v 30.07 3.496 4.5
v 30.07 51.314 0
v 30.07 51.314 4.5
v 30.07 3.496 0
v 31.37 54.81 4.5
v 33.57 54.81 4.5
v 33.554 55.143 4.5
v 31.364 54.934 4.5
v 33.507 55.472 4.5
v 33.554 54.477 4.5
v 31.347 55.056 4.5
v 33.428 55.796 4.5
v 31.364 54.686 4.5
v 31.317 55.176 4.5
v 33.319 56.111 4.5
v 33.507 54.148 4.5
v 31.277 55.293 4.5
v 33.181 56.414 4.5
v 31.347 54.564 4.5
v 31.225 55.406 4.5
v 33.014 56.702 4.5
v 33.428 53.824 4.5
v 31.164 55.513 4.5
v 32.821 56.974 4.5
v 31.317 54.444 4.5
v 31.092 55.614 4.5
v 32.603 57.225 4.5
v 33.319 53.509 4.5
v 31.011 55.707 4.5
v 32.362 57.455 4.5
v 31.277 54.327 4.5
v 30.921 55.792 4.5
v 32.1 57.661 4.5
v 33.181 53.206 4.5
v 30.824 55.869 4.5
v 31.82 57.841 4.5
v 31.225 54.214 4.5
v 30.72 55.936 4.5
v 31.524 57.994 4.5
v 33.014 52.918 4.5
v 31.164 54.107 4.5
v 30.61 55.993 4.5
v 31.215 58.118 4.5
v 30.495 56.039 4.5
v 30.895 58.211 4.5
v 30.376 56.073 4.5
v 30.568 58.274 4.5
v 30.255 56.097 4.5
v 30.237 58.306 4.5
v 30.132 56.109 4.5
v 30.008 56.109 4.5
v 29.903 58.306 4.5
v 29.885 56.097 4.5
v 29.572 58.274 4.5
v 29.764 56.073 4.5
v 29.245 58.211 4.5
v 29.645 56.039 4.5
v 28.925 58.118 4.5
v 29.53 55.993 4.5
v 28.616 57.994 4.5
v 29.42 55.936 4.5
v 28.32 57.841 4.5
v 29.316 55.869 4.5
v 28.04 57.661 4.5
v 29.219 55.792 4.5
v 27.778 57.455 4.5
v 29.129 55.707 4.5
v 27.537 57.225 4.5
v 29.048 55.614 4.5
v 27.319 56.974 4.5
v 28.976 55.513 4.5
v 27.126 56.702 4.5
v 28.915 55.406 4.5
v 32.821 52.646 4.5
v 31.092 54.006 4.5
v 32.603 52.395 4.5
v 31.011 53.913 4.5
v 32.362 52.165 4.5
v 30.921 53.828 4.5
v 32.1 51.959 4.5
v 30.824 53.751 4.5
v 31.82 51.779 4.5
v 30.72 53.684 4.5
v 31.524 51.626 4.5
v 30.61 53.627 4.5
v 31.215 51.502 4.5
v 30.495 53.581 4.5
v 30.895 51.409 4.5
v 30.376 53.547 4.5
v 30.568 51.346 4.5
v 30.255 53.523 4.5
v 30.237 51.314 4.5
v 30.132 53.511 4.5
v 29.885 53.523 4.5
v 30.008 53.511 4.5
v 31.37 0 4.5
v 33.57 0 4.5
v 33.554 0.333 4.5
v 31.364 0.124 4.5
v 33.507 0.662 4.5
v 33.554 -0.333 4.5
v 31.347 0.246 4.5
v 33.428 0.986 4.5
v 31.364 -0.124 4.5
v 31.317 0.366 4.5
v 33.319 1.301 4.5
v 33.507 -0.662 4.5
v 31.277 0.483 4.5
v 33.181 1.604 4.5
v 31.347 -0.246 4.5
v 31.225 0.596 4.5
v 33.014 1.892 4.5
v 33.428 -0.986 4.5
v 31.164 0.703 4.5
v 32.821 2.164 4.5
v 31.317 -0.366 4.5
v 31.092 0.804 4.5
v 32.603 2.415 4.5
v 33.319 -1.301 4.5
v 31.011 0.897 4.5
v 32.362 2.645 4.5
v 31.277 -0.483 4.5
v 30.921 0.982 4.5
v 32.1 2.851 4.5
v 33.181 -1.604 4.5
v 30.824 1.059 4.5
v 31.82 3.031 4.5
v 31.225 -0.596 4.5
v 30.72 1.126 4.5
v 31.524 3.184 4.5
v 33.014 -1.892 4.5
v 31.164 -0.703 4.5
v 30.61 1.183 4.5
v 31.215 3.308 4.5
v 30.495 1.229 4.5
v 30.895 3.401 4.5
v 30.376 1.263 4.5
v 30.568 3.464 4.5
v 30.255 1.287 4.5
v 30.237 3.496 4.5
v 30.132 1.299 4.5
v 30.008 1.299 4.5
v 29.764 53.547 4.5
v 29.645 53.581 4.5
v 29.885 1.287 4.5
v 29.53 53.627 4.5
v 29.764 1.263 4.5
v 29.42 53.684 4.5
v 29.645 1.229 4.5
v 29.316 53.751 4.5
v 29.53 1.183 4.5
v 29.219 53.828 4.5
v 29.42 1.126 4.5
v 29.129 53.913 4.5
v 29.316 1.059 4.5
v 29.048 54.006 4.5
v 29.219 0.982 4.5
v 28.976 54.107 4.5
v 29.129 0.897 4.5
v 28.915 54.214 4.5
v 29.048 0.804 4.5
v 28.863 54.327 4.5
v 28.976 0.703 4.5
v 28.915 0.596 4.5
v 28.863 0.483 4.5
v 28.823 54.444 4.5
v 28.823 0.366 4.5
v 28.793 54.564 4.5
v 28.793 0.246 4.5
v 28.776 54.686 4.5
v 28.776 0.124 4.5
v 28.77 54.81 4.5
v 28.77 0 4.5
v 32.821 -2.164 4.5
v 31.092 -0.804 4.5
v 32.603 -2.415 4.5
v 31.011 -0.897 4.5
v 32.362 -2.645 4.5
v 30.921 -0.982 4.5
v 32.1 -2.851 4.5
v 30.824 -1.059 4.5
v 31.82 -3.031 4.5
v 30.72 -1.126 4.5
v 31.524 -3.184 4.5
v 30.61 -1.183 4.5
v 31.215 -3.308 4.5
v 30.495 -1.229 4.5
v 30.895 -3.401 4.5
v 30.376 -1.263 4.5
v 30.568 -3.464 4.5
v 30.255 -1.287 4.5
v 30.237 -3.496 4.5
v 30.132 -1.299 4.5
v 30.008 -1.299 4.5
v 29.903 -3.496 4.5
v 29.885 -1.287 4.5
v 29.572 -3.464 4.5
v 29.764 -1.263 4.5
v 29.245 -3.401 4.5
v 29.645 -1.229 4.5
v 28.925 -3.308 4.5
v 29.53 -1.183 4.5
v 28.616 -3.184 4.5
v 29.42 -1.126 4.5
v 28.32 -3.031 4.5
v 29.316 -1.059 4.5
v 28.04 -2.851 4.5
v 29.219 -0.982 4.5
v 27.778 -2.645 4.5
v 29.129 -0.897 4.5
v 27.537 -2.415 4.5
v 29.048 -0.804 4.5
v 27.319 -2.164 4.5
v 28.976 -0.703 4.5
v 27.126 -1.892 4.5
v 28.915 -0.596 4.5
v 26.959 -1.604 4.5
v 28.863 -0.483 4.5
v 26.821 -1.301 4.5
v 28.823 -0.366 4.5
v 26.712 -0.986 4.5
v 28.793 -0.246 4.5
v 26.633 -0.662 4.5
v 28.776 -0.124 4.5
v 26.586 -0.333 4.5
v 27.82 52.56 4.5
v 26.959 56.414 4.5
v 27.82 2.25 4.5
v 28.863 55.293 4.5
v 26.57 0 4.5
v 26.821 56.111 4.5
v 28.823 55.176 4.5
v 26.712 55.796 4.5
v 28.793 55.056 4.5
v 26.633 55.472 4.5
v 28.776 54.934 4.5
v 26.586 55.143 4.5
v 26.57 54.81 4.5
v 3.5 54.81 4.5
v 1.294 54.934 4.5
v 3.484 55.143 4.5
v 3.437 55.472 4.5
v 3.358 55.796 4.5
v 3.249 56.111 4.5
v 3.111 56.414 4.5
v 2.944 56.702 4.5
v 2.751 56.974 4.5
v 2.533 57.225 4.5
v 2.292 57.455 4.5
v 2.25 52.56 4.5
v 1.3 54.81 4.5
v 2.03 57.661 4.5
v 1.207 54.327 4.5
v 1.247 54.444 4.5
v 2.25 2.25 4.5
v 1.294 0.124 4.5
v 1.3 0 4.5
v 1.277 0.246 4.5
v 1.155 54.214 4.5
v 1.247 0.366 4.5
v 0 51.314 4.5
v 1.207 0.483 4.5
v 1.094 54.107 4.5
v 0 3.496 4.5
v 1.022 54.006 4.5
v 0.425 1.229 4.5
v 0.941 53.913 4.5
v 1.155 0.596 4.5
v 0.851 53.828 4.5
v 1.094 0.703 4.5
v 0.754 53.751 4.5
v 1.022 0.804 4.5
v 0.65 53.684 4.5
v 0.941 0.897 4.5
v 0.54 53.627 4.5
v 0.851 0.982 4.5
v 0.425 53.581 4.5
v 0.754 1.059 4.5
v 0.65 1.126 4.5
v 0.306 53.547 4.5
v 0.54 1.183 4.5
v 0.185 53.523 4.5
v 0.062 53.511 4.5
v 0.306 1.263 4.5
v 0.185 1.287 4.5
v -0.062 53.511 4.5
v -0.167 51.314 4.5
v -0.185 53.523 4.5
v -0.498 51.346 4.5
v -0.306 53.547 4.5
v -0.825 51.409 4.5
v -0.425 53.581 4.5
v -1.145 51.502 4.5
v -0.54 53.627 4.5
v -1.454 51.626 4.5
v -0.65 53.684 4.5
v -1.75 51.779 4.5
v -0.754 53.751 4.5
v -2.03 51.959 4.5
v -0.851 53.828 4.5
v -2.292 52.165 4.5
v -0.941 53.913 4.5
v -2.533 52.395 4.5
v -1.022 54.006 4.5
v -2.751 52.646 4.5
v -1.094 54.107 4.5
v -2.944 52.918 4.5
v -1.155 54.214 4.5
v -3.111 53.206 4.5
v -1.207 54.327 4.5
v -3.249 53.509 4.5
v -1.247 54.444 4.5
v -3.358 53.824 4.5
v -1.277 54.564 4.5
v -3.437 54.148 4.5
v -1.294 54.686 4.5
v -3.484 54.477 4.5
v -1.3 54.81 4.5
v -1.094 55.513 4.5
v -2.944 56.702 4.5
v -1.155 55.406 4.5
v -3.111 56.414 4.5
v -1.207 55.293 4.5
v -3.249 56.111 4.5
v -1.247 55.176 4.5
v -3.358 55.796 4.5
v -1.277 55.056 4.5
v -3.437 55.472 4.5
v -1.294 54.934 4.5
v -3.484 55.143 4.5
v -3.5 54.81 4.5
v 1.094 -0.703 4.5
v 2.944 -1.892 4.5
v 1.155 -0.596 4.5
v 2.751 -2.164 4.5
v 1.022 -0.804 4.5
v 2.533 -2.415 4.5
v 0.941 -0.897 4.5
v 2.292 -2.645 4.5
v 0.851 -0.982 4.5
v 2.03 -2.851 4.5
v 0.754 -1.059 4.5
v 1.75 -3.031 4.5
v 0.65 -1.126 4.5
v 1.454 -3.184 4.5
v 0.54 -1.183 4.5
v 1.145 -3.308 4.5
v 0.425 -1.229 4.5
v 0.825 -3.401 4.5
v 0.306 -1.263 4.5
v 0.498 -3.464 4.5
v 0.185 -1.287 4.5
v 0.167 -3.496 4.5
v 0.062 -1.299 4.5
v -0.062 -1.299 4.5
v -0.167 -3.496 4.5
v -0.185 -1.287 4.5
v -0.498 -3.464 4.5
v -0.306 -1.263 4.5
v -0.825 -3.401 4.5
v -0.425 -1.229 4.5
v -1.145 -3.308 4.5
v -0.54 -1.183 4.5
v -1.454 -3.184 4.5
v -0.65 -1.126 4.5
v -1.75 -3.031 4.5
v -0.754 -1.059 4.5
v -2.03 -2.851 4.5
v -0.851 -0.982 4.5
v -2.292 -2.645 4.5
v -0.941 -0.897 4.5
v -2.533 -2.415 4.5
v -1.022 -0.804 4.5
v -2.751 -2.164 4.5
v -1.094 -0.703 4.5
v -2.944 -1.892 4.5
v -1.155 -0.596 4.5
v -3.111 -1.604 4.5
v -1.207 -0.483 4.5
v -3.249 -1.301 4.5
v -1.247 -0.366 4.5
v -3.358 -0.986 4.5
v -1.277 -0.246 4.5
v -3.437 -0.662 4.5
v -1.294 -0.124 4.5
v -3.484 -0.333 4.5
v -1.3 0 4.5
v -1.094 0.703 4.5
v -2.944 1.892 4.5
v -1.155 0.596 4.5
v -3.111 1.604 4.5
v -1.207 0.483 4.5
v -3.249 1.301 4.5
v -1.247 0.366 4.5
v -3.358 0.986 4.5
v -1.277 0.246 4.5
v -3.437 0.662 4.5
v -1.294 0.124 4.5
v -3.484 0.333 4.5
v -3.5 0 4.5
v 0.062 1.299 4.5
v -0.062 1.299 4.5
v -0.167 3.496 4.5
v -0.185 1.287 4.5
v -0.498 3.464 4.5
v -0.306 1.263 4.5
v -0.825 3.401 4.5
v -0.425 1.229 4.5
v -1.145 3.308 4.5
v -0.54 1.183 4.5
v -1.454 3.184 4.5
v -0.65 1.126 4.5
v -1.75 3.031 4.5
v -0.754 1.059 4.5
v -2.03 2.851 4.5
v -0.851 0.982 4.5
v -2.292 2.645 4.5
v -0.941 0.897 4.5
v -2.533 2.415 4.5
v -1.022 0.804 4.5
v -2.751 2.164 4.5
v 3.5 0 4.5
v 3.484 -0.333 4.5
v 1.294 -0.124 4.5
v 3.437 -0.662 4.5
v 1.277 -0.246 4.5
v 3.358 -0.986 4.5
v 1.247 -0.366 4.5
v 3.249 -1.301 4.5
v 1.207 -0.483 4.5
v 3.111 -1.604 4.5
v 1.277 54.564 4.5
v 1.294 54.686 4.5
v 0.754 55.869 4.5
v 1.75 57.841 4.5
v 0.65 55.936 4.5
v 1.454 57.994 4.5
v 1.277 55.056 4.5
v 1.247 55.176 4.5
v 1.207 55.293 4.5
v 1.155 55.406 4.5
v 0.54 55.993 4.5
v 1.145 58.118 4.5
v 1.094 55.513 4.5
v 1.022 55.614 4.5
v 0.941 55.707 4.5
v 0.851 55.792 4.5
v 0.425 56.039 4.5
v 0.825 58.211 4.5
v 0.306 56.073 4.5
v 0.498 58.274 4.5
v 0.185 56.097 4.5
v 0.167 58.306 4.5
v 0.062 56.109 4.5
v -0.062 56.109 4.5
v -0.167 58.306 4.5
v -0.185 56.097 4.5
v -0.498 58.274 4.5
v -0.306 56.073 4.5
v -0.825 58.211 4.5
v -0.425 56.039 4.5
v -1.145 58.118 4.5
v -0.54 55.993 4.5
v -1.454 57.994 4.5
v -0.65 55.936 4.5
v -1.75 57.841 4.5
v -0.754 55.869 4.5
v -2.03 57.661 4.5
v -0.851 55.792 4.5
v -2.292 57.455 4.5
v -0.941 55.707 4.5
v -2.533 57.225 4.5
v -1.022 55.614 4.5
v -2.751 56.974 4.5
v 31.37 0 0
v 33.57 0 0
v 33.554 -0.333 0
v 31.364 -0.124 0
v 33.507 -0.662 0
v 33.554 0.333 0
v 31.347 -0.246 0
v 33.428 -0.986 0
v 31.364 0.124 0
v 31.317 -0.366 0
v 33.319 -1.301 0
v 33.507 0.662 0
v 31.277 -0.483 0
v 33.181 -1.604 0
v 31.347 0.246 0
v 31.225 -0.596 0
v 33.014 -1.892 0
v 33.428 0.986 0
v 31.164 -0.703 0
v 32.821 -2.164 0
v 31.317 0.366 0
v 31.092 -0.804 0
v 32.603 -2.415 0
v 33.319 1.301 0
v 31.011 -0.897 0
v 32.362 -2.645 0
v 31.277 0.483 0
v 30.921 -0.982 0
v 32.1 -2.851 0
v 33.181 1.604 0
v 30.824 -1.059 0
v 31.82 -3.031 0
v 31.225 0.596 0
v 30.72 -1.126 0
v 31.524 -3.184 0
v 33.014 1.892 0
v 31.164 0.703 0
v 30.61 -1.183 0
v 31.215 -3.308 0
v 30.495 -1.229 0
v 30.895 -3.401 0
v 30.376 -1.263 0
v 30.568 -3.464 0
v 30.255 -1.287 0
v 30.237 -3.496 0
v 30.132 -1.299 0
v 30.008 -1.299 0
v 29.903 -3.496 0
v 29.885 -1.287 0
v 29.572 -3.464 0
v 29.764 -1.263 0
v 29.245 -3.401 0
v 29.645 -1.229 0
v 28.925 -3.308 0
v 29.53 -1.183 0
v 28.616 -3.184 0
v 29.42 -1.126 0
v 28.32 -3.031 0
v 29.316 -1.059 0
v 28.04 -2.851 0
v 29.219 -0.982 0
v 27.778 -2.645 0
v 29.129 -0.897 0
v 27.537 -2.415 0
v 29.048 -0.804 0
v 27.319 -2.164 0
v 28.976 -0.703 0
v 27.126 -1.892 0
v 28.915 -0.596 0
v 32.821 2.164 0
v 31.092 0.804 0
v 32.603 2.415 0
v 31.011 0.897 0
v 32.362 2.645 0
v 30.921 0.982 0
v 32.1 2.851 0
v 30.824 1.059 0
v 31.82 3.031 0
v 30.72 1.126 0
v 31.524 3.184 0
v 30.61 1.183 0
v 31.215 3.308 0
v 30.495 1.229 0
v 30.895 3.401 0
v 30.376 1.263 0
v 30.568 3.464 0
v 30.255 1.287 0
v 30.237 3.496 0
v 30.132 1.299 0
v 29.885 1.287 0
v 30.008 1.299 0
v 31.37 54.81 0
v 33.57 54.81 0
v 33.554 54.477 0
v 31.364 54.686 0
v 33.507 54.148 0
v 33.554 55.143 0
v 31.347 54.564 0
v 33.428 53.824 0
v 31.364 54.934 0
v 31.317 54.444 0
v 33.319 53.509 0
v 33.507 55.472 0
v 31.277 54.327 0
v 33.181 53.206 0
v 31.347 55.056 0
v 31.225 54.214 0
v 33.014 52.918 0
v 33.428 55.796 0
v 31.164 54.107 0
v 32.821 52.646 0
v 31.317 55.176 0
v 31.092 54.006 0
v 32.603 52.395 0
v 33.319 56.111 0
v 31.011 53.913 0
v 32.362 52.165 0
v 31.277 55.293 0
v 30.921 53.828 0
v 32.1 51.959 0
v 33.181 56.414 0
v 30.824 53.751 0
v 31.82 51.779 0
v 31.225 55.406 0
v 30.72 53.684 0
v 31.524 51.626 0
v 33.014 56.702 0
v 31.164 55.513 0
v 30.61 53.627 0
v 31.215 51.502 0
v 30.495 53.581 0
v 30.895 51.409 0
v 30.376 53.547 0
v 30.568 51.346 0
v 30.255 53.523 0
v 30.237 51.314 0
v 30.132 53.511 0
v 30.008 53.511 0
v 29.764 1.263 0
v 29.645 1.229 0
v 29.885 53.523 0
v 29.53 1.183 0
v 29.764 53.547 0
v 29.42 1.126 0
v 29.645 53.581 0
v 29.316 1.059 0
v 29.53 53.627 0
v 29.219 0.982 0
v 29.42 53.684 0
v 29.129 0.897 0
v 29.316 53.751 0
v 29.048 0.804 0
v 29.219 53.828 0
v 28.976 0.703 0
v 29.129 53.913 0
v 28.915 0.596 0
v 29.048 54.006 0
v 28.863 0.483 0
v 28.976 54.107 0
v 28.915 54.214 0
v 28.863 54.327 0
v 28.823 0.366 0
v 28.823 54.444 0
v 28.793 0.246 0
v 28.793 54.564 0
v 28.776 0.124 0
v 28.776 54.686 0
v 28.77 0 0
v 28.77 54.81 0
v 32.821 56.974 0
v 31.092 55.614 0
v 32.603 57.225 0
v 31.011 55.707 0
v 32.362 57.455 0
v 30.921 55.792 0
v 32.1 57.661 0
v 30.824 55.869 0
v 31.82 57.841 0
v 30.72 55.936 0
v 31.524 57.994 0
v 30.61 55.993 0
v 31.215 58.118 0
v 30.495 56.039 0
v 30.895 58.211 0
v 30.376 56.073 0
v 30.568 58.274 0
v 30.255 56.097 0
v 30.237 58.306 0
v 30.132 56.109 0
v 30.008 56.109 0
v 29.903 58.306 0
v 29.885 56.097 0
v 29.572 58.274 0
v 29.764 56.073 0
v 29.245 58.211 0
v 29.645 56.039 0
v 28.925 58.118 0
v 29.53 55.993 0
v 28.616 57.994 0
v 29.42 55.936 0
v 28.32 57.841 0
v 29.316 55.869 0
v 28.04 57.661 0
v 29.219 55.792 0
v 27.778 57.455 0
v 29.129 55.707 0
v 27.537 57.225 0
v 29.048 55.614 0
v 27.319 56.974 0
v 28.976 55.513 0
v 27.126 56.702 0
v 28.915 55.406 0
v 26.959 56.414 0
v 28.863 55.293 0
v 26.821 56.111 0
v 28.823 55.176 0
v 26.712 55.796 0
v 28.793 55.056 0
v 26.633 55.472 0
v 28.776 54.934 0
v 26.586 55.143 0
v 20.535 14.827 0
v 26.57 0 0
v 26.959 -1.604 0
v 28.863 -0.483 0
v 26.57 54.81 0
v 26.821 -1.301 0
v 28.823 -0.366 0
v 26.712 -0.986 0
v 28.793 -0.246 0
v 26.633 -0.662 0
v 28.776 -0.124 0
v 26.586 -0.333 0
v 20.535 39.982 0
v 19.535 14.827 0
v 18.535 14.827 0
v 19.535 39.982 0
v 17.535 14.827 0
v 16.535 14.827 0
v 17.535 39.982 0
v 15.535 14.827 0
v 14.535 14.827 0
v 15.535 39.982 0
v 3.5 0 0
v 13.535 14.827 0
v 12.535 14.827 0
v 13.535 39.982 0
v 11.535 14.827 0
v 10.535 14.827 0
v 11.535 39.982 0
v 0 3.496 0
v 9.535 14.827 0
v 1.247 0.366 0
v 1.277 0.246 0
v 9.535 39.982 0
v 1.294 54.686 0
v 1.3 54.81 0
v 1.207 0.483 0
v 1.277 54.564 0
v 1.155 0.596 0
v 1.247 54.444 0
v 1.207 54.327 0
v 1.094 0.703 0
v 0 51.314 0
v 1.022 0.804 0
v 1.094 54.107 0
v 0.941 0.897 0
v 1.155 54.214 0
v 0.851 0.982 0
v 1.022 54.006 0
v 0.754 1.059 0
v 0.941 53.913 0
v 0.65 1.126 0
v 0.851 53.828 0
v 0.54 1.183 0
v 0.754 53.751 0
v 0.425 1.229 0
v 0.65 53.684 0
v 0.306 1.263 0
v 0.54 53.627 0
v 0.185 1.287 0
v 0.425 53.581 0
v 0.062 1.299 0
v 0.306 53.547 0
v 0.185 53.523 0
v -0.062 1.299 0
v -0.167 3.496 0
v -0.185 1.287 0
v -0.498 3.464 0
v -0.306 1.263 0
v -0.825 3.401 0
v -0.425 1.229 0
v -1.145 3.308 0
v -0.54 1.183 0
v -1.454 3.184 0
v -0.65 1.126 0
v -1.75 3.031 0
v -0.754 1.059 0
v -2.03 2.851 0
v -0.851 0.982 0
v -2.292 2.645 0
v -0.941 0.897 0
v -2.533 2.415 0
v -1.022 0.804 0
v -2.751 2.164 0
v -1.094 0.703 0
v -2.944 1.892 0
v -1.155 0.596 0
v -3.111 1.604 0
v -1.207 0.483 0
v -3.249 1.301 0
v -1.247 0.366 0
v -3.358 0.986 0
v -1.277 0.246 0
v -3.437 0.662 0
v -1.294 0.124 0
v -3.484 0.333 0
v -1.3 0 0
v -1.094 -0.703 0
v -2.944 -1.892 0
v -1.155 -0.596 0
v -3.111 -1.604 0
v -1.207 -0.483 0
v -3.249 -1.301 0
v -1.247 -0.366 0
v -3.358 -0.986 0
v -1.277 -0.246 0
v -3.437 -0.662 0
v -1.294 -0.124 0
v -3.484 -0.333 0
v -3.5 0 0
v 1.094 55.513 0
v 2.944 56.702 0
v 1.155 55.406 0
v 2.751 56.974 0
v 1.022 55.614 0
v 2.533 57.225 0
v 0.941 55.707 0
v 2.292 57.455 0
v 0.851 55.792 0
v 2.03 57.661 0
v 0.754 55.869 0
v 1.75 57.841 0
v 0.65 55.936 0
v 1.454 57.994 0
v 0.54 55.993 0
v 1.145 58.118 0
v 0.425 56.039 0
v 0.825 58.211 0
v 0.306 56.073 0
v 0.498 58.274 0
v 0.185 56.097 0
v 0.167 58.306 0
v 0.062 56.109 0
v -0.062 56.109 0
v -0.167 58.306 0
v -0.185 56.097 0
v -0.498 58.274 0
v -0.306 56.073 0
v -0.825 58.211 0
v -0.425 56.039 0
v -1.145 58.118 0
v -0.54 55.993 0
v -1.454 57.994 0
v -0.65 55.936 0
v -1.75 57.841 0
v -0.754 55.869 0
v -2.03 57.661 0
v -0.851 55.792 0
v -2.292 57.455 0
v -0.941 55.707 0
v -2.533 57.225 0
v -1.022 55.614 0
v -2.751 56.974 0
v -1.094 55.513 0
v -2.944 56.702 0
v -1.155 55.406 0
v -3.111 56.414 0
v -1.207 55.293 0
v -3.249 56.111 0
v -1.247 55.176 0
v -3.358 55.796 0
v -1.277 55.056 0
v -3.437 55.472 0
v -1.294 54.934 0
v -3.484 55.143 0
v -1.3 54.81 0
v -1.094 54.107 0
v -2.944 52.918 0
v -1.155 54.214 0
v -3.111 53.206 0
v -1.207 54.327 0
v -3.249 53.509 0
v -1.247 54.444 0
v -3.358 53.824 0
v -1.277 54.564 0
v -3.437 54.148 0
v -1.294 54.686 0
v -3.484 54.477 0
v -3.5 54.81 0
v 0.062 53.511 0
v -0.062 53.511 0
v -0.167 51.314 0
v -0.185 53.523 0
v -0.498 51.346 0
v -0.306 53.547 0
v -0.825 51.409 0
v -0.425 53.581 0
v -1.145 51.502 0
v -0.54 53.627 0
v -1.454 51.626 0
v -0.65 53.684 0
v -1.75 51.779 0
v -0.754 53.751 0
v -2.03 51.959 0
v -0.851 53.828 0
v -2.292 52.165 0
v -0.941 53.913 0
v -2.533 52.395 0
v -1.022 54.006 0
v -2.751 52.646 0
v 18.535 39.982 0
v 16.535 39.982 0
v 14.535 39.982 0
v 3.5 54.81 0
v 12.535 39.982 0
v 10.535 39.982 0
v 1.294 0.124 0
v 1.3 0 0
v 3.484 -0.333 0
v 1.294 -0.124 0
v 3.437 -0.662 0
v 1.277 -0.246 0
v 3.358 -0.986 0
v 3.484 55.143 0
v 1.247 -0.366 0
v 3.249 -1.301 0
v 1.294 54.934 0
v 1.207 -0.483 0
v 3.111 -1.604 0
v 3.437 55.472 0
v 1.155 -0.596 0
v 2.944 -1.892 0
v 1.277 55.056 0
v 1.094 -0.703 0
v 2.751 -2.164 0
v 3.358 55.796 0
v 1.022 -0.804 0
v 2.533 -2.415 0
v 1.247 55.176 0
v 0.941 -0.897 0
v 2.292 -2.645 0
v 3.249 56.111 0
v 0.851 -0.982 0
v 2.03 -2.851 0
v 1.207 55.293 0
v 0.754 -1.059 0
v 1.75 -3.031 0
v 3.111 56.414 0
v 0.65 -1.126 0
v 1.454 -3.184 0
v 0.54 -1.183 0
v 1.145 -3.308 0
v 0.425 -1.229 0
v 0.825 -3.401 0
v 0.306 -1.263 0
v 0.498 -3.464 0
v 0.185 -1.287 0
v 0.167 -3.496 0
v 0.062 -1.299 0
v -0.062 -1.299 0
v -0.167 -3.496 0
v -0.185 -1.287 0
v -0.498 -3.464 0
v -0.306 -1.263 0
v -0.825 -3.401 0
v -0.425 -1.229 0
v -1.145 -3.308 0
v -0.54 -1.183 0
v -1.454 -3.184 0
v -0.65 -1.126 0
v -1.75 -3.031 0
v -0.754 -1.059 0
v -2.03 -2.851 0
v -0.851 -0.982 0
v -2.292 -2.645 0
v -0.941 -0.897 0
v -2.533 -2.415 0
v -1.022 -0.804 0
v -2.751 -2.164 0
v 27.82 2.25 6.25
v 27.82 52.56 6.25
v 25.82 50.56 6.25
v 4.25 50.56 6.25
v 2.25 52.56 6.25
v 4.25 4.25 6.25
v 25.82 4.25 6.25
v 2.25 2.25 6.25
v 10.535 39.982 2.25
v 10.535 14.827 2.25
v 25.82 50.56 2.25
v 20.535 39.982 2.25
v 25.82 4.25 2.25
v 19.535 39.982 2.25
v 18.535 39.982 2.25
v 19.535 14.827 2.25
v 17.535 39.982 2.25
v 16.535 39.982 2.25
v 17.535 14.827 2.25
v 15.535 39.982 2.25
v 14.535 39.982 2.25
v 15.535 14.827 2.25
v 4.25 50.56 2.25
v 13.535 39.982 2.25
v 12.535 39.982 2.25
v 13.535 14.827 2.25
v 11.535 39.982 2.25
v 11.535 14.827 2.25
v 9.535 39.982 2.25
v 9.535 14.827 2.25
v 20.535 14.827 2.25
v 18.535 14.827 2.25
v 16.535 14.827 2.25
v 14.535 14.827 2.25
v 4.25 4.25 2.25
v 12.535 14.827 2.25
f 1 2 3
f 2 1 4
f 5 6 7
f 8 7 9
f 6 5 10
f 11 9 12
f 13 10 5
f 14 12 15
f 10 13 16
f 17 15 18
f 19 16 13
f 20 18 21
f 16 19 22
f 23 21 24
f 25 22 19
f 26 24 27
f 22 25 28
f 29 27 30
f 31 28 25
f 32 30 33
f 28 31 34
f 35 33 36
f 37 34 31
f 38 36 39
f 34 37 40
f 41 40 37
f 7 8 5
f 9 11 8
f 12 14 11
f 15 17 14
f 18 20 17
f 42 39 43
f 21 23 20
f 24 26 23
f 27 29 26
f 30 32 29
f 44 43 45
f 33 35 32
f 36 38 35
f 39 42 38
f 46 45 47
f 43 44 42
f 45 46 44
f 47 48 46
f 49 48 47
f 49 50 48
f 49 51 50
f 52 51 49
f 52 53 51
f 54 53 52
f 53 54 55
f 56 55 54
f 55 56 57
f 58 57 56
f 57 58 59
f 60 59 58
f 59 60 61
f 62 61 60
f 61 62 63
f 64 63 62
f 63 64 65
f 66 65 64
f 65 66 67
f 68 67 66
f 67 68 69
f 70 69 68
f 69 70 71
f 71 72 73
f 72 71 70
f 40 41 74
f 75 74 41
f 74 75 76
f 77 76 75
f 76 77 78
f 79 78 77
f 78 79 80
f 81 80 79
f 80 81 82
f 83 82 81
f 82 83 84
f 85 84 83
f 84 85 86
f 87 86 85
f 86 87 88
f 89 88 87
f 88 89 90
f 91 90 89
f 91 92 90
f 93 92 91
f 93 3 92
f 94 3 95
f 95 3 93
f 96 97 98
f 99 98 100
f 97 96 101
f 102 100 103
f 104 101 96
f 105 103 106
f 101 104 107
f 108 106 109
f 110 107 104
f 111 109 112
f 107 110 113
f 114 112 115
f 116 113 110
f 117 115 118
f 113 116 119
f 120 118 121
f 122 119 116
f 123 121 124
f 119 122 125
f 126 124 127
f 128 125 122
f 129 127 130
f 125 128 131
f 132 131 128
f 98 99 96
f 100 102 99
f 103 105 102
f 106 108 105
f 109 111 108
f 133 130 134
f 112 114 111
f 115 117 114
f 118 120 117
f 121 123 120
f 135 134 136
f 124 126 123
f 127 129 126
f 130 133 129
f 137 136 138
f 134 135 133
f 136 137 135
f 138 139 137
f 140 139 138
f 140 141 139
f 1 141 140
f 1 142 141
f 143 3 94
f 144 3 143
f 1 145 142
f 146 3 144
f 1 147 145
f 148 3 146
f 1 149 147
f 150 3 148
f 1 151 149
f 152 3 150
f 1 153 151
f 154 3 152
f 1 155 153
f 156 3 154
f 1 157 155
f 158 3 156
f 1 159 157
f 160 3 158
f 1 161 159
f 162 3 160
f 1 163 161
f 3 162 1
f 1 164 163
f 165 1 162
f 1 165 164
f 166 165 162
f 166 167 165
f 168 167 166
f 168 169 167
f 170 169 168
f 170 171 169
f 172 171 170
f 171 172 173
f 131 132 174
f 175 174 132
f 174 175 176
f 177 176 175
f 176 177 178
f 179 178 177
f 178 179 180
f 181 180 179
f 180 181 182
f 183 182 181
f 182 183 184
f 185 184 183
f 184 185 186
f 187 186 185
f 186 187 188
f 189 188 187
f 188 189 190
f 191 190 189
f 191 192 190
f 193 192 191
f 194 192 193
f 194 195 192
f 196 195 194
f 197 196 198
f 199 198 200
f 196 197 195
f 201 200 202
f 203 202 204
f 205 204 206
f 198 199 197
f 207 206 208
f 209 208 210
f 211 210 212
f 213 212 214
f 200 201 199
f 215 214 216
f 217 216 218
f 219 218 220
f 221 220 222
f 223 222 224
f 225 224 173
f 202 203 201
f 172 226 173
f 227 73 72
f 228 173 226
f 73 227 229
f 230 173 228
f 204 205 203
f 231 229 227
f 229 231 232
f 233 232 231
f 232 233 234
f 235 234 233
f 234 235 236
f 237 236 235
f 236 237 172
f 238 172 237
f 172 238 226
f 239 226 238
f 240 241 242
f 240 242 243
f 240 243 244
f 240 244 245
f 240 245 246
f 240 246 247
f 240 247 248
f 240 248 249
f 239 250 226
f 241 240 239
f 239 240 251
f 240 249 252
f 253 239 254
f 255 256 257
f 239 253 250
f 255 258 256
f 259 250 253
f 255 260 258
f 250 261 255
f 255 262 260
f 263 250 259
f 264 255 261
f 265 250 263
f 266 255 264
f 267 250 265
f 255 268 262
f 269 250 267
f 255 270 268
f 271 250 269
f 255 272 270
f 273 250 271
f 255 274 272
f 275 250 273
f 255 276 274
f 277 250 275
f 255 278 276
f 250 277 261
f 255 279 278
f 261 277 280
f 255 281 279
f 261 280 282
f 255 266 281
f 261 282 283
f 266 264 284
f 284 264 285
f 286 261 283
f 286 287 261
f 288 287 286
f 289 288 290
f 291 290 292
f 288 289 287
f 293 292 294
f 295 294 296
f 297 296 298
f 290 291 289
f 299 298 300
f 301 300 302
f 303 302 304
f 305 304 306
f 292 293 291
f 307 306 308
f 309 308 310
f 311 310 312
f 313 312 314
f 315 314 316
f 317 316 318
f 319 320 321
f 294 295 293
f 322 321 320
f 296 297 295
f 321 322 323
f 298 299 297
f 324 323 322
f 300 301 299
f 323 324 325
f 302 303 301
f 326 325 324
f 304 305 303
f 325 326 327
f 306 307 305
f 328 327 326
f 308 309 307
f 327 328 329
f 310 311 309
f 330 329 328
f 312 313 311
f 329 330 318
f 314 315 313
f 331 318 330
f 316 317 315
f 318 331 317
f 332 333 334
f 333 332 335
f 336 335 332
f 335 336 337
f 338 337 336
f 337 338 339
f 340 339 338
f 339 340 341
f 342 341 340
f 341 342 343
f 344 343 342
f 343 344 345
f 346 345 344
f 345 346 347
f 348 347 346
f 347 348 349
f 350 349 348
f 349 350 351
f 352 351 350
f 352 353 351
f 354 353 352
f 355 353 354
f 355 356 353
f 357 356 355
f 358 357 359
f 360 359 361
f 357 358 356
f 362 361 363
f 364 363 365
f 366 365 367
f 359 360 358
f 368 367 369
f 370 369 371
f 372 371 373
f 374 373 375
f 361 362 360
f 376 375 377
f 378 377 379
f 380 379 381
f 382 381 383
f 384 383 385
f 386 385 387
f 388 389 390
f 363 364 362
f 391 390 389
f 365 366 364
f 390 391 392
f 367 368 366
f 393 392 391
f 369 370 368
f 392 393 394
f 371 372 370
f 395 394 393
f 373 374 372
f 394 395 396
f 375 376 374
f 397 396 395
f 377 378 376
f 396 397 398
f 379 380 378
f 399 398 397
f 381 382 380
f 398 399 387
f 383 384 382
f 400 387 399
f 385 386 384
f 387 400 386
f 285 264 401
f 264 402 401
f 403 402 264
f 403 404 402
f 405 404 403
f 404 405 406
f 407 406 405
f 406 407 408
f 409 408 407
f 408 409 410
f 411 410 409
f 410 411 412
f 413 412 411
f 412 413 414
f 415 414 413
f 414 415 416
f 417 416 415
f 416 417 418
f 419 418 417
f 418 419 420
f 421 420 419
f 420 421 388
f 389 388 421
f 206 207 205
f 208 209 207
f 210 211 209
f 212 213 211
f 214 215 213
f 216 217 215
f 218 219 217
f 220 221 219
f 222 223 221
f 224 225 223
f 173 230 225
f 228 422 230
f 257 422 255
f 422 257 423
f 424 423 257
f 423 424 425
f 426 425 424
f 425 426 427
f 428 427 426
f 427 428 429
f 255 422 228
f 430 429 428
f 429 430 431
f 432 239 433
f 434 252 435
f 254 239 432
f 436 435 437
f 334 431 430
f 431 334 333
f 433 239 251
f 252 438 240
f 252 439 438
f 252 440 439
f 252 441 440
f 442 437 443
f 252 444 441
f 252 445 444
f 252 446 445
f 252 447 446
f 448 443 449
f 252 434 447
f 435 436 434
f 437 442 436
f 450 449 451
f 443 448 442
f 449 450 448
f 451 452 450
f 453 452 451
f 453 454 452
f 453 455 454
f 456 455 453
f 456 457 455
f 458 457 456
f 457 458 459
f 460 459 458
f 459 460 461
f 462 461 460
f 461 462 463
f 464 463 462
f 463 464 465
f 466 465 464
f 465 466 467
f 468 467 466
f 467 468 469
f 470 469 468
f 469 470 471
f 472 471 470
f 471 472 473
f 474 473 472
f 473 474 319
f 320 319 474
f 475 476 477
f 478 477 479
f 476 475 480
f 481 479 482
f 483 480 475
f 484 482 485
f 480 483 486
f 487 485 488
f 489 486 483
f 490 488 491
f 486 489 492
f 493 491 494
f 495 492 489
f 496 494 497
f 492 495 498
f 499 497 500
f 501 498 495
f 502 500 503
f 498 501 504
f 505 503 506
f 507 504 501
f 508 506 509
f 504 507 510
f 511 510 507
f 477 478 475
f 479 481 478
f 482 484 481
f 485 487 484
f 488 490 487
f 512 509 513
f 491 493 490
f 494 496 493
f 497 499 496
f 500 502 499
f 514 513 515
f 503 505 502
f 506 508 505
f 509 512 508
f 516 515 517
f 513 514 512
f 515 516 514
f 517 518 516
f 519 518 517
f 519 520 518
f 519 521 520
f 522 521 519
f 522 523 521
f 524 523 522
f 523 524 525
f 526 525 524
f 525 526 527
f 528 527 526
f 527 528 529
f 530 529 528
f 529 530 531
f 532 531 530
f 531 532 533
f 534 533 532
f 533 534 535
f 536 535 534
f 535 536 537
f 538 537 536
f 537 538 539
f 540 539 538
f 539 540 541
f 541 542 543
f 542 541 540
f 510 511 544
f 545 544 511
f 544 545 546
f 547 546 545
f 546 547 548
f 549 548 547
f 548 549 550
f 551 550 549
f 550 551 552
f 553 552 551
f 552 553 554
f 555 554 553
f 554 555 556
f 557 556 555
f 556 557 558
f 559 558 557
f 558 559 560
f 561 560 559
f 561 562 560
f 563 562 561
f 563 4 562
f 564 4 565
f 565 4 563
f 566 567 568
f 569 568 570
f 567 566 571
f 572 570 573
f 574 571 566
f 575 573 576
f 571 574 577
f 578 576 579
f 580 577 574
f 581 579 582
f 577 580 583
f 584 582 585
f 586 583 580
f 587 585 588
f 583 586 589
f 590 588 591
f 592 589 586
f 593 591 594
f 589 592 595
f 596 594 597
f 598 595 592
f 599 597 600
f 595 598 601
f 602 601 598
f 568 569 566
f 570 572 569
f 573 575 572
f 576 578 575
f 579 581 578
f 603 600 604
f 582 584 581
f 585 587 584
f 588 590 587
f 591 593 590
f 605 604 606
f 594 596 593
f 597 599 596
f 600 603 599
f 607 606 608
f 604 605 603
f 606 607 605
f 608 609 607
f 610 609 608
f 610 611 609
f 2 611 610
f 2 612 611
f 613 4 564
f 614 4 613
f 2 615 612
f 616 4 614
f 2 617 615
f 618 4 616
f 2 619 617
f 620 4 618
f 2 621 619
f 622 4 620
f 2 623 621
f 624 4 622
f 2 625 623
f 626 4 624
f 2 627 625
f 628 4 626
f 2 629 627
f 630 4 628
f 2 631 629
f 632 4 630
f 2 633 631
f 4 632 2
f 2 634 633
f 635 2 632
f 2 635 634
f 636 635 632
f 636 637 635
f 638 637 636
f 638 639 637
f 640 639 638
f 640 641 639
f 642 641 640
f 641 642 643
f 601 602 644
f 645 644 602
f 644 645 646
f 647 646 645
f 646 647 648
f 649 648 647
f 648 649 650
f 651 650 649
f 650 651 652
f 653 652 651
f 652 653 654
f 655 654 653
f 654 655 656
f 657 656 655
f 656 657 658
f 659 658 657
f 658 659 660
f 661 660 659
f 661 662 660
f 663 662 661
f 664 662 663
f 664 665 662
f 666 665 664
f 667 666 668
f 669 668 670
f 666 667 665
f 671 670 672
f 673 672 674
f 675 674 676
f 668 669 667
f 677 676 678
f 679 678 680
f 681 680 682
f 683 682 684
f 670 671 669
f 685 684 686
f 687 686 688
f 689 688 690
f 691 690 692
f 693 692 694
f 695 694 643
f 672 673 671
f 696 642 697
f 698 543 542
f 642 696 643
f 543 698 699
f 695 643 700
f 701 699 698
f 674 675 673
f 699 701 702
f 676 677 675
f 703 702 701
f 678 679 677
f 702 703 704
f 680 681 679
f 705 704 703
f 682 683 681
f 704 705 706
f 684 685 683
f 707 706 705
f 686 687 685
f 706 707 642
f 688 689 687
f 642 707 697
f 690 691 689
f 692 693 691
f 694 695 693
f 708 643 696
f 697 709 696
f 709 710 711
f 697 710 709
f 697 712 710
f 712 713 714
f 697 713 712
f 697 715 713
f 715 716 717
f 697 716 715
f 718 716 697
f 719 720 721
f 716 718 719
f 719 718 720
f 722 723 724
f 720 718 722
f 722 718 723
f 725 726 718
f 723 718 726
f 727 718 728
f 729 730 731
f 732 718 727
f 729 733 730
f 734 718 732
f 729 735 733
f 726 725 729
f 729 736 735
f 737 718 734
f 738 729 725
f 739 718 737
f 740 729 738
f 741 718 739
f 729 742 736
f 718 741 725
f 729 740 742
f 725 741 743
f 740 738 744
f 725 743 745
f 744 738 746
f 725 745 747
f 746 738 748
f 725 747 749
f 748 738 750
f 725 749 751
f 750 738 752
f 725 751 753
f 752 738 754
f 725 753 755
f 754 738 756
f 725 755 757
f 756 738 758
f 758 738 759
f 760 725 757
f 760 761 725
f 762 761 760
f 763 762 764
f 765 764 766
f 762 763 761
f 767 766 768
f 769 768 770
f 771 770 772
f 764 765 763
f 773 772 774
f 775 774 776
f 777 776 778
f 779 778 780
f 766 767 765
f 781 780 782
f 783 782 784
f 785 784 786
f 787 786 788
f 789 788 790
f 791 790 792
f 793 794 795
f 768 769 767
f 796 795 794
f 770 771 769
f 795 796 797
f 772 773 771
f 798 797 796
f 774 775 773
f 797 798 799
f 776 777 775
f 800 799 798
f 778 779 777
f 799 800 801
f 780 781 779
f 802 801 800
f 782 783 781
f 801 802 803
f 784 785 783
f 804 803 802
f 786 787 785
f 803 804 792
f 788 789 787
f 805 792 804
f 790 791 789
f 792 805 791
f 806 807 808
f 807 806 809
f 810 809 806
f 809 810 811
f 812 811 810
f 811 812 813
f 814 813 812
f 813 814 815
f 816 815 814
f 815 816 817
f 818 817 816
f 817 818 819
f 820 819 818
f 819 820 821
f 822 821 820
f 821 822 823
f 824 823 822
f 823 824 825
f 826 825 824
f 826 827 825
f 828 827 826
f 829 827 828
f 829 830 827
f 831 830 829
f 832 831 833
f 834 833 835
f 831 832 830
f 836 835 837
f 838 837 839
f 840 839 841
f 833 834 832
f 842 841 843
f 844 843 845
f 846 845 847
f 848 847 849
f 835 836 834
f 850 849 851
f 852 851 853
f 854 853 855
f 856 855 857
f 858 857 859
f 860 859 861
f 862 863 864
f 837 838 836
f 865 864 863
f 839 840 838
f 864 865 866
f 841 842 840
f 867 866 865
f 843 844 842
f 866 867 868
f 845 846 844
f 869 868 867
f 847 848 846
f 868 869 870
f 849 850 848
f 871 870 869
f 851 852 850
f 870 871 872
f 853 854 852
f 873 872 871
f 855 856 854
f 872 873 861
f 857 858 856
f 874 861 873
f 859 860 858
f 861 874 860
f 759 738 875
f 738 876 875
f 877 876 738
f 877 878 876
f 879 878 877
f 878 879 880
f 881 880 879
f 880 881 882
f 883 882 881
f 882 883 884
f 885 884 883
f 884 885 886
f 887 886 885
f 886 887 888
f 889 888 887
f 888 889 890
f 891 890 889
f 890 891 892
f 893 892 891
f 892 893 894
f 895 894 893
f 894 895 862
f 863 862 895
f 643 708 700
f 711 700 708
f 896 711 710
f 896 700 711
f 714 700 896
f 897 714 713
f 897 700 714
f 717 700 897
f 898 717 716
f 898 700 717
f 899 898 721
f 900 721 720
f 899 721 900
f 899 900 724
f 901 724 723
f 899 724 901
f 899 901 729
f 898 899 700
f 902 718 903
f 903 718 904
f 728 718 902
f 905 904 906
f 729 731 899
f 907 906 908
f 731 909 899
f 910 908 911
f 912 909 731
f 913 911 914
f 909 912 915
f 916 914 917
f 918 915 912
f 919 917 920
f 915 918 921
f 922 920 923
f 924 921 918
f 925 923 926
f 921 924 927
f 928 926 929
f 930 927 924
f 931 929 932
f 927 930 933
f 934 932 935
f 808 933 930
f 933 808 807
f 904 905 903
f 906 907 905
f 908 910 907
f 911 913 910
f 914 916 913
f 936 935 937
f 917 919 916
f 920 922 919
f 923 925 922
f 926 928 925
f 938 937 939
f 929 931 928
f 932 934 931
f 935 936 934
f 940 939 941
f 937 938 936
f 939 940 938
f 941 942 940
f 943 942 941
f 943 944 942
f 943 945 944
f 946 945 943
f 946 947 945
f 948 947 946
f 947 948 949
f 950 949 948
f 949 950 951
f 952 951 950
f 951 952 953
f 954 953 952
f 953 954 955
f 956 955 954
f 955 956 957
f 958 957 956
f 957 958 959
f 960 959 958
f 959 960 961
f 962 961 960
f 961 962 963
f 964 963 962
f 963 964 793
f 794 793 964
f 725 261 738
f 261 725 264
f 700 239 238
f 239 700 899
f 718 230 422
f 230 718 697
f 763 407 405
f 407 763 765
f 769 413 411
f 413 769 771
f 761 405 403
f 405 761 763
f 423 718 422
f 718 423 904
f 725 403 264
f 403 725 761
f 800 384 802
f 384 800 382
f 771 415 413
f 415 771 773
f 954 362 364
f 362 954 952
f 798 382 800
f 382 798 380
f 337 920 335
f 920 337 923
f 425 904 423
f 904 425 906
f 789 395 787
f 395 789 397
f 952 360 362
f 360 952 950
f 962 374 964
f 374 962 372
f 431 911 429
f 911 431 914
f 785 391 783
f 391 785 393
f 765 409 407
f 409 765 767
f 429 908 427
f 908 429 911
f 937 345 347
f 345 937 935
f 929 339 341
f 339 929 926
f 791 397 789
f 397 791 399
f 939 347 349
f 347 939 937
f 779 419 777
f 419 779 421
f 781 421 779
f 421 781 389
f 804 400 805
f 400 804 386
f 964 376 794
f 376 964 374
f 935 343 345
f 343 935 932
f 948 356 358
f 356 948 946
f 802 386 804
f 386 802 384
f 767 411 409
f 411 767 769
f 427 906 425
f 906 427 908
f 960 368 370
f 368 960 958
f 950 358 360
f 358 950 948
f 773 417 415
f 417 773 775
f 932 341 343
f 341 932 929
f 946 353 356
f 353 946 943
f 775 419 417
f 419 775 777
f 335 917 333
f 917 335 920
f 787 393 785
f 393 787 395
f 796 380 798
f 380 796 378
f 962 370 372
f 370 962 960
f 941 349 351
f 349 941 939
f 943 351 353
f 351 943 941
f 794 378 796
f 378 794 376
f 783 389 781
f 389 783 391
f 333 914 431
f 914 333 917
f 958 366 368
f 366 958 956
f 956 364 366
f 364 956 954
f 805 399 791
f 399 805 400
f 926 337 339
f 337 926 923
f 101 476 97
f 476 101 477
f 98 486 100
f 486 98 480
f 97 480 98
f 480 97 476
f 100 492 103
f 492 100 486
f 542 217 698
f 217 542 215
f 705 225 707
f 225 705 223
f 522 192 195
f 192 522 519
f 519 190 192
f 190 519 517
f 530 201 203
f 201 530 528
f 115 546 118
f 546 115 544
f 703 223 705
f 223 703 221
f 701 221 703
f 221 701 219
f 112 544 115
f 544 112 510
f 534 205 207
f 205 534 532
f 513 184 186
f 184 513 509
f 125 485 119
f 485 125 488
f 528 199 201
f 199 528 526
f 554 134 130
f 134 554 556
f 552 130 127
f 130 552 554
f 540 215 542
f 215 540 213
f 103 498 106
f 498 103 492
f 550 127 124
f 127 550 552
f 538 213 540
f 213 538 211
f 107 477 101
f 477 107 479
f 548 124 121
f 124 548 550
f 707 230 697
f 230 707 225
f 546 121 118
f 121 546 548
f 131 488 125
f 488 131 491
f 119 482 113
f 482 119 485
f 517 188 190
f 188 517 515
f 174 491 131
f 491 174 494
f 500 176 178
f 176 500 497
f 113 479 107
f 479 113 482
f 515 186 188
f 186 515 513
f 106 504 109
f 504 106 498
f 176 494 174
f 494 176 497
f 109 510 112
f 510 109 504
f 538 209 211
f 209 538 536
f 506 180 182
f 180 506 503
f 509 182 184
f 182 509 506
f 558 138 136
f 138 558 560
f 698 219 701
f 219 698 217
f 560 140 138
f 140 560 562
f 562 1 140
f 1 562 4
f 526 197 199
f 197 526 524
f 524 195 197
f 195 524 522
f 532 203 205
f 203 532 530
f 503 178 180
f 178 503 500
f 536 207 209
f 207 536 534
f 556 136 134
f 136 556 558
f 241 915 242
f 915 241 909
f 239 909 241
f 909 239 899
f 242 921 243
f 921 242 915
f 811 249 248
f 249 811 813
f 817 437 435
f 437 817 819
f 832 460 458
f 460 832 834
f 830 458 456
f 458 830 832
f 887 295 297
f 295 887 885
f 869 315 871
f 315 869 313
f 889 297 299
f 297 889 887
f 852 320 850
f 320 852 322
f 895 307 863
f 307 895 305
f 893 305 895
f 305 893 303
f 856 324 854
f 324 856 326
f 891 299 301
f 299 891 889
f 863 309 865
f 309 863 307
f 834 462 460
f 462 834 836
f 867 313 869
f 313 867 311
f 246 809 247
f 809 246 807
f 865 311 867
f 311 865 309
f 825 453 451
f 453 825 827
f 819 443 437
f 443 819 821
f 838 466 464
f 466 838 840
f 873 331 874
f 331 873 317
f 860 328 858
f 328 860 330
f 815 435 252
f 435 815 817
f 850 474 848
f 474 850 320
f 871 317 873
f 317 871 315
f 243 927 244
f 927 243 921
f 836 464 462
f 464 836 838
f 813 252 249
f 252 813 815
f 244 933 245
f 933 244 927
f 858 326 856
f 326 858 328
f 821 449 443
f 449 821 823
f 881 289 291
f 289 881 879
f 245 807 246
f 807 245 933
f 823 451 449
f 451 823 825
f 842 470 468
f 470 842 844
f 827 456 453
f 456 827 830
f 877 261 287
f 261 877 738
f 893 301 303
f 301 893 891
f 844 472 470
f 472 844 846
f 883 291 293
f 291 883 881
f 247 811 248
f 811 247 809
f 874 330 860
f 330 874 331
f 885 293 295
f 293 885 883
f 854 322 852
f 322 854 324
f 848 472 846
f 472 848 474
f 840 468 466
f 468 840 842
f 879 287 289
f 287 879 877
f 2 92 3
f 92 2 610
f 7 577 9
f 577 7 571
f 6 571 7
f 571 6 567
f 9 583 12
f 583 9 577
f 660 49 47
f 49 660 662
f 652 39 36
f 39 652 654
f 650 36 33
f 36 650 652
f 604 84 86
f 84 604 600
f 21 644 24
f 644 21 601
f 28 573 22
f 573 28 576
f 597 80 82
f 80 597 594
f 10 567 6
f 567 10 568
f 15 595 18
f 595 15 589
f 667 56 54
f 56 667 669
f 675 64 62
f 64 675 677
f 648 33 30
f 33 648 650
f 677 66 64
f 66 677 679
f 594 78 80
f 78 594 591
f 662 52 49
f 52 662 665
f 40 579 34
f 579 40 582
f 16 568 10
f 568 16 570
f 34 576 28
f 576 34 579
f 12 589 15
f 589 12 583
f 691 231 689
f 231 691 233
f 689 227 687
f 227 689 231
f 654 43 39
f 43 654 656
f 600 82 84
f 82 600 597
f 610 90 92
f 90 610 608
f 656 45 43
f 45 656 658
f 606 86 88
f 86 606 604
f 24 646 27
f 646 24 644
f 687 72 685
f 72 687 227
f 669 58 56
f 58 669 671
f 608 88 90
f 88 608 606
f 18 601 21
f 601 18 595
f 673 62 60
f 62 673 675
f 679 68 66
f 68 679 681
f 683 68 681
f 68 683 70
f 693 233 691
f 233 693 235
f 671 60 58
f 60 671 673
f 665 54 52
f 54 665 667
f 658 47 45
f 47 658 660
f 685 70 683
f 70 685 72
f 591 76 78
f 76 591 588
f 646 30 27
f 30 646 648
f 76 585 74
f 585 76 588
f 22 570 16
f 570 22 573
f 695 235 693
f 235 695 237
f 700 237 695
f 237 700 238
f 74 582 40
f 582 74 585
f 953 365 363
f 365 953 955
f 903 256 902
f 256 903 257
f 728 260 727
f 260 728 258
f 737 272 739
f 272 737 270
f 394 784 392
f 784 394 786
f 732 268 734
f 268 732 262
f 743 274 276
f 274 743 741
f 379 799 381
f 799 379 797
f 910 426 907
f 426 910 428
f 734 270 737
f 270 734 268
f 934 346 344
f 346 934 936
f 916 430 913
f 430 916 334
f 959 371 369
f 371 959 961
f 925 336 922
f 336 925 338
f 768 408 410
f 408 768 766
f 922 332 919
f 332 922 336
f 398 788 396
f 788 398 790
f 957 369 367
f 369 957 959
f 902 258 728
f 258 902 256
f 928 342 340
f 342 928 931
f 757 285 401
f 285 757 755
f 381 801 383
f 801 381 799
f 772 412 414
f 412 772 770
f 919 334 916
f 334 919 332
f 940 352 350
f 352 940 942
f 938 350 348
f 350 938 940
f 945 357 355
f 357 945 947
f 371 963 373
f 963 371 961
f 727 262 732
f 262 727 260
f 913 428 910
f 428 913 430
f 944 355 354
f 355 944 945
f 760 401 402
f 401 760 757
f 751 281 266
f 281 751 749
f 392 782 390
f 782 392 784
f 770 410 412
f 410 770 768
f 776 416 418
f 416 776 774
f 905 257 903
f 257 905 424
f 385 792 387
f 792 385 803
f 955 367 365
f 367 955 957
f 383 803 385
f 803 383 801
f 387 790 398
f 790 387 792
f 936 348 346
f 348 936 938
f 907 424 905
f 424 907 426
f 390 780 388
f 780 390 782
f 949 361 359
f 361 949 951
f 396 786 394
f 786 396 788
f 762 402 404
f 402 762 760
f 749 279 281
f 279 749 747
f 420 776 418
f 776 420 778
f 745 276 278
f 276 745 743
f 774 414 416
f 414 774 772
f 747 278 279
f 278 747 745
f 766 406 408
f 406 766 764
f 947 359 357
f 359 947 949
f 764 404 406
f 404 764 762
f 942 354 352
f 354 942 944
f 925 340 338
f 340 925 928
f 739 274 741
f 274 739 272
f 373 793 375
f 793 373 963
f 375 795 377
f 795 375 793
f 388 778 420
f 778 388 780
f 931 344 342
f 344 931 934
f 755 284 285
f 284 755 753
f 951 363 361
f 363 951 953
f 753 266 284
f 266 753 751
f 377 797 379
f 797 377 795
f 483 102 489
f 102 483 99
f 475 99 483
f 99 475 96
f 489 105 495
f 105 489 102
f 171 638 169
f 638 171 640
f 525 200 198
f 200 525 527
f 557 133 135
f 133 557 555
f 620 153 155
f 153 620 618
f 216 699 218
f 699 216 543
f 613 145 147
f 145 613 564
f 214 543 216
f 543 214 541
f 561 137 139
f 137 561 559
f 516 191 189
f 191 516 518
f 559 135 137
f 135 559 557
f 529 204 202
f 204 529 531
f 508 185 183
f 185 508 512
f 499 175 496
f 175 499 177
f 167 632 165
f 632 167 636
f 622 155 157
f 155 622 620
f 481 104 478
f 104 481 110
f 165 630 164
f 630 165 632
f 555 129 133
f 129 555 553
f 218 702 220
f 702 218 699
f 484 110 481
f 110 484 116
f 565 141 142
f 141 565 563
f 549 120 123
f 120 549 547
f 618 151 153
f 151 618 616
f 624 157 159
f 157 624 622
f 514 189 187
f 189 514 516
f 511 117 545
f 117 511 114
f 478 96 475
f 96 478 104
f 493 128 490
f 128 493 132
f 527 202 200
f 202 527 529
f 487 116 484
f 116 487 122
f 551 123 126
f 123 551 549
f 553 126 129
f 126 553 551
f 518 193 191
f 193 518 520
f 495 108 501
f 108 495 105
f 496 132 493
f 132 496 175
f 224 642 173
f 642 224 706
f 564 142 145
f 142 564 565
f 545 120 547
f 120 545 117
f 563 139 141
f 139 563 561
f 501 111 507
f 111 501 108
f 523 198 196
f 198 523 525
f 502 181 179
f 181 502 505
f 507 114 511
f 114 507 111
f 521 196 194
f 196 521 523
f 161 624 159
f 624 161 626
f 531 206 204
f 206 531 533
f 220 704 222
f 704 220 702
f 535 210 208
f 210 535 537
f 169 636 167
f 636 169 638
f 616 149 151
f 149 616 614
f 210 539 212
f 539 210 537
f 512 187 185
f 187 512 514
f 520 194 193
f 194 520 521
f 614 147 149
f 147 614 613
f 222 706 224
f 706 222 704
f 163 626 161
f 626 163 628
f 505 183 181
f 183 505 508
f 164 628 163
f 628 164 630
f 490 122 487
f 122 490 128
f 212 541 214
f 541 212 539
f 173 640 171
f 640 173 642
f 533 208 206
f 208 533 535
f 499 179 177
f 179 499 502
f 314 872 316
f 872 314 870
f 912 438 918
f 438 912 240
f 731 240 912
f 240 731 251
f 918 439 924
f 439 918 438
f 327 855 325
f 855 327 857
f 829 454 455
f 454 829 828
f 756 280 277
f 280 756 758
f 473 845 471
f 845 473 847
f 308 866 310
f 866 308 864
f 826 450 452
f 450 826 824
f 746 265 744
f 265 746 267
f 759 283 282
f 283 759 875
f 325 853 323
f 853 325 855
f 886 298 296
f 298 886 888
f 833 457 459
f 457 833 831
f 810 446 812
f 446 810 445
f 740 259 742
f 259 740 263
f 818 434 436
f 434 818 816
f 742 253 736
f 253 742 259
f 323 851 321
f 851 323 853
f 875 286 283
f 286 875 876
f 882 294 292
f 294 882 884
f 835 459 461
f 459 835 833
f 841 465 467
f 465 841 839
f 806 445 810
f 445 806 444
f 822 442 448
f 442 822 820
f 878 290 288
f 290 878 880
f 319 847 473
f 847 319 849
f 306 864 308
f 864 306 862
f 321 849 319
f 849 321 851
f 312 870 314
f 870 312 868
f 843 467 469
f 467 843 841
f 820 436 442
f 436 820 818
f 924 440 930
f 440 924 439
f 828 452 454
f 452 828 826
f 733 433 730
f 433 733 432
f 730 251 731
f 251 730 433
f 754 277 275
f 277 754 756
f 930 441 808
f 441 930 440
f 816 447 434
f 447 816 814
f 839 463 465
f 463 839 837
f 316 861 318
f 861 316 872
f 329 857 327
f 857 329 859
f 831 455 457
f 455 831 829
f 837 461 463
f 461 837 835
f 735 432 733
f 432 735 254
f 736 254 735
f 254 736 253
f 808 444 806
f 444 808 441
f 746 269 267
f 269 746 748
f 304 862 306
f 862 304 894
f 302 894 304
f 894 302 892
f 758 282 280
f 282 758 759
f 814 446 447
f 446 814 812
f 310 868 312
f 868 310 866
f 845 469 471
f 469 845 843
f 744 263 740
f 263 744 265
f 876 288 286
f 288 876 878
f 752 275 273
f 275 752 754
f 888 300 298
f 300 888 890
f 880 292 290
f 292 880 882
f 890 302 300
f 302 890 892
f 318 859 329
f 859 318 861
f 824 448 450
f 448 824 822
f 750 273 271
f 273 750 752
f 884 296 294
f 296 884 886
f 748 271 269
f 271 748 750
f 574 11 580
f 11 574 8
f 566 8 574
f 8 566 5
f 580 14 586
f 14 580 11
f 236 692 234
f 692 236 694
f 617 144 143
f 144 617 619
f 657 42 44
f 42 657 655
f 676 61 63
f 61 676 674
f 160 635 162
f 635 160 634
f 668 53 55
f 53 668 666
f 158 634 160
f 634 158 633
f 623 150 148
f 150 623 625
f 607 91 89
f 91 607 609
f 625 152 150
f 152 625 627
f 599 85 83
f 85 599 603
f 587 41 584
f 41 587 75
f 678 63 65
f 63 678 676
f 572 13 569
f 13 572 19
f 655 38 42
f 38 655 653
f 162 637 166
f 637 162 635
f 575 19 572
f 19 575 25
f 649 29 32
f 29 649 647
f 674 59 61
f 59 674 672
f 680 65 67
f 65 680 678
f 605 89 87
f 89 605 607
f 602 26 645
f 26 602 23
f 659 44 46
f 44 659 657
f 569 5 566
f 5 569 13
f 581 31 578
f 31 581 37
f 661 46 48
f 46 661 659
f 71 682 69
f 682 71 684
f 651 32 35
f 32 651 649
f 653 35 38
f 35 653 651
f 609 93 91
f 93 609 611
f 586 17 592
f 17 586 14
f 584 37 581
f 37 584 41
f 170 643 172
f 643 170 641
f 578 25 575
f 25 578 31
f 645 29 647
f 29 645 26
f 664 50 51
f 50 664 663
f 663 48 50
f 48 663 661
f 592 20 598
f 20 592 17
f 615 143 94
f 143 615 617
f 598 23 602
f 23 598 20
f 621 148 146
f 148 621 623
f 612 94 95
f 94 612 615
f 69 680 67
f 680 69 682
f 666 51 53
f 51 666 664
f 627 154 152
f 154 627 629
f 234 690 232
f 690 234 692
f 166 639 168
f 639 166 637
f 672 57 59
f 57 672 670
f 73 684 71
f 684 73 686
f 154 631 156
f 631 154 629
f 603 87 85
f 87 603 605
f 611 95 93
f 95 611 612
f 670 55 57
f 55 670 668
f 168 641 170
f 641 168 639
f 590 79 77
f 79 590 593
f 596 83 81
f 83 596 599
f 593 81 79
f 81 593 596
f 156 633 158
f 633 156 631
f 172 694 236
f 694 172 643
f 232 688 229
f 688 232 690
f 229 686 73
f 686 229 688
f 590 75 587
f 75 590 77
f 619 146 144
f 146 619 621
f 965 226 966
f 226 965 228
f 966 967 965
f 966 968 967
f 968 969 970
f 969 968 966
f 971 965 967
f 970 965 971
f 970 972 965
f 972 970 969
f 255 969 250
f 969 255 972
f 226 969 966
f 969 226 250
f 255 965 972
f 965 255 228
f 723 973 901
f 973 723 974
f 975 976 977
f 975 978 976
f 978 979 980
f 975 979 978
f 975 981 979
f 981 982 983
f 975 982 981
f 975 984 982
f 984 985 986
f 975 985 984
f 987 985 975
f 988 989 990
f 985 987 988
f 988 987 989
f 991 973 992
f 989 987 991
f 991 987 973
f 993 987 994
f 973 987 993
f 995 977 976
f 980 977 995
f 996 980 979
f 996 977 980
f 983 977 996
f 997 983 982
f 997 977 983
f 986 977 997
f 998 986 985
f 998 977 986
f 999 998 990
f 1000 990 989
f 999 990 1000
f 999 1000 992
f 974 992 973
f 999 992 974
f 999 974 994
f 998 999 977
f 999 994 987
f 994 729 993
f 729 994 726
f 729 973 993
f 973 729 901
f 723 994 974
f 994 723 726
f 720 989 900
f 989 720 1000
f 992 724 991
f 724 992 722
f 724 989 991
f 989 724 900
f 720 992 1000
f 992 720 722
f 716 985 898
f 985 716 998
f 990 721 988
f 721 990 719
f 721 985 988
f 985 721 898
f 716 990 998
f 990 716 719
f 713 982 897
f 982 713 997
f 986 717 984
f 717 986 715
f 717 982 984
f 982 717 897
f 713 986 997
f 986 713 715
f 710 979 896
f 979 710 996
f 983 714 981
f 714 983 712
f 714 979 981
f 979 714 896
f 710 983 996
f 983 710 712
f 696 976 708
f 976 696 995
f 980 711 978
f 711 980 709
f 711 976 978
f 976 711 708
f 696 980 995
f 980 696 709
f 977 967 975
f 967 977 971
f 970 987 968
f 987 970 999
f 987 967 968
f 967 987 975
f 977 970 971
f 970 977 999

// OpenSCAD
board_x = 25.57;
board_y = 50.31;
wall_thickness = 2.25;
corner_rad = 7.0 / 2;
front_height = 17;
lcd_ridge_height = 4; //4.5;
lcd_hole_x_len = 15.0;
lcd_hole_y_len = 23.0;
lcd_hole_x = 4.35;
lcd_hole_y = 7;
lcd_x_frame = 2.5;
lcd_y_frame = 6.0;
lcd_x_len = 20;
lcd_y_len = 25.75;
control_y = 14.75;

// back
back_height = wall_thickness;



module outside(height) {
    difference() {
        union() {
            cube([board_x + (2* wall_thickness),
                board_y + (2 * wall_thickness),
                    height + wall_thickness]);
            cylinder(r=corner_rad, h=(height+wall_thickness), $fn=66);
            translate([board_x + (2*wall_thickness), 0, 0]) cylinder(r=corner_rad, h=(height+wall_thickness), $fn=66);
            translate([0, board_y + (2*wall_thickness), 0]) cylinder(r=corner_rad, h=(height+wall_thickness), $fn=66);
            translate([board_x + (2*wall_thickness), board_y + (2*wall_thickness), 0]) cylinder(r=corner_rad, h=(height+wall_thickness), $fn=66);           
        }
        cylinder(r=1.3, h=(height + wall_thickness + 0.01), $fn=66);
        translate([board_x + (2*wall_thickness), 0, 0]) cylinder(r=1.3, h=(height + wall_thickness + 0.01), $fn=66);
        translate([0, board_y + (2*wall_thickness), 0]) cylinder(r=1.3, h=(height + wall_thickness + 0.01), $fn=66);
        translate([board_x + (2*wall_thickness), board_y + (2*wall_thickness), 0]) cylinder(r=1.3, h=(height + wall_thickness + 0.01), $fn=66);
    
    }
}

module front() {
    difference() {
        outside(front_height);
    
        //lcd hole
        translate([wall_thickness + lcd_hole_x, 
               wall_thickness + lcd_hole_y, -0.1])
            cube([lcd_hole_x_len, lcd_hole_y_len, front_height + wall_thickness]);
        // board support/lcd frame
        translate([wall_thickness + lcd_x_frame, wall_thickness + lcd_y_frame, wall_thickness])
            cube([lcd_x_len, lcd_y_len, lcd_ridge_height]);
        // control cutout
        translate([wall_thickness, wall_thickness + board_y - control_y, wall_thickness])
            cube([board_x, control_y, lcd_ridge_height]);
        
        // board cutout
        translate([wall_thickness, wall_thickness, wall_thickness + lcd_ridge_height])
            cube([board_x, board_y, front_height]);
        
        // LED: 4x1.5 @ 5 in x 13 in y
        translate([wall_thickness + 5, 
                   wall_thickness + board_y - 13, 
                   -0.1])
            cube([4, 1.5, wall_thickness+0.1]);
        
        // prg: 2mm dia @ (board_x - 4),(board_y-3.5)
        translate([wall_thickness + 4 + 1, 
                   wall_thickness + board_y - 3.5, 
                   -0.1])
            cylinder(d=2, h=wall_thickness+0.1);
            
        // rst: 2mm dia @ (board_x - 4.47),(board_y-3.5)
        translate([wall_thickness + board_x - 4.5 + 1, 
                   wall_thickness + board_y - 3.5, 
                   -0.1])
            cylinder(d=2, h=wall_thickness+0.1);
        // usb: 9.25mm from either edge, 3.25 high
        translate([wall_thickness + 9.25, wall_thickness + board_y -0.01, wall_thickness])
            cube([7.50, wall_thickness + 0.01, 3.25]);

        // vents!
        for ( i = [1:1:6] ) {
            translate( [-0.5, wall_thickness + 2 + (i * 5), wall_thickness + lcd_ridge_height])
                rotate([0,0,-30])
                    cube([wall_thickness + 1, 2.5, 10]);
            translate( [board_x + wall_thickness -0.5, wall_thickness + 2 + (i * 5), wall_thickness + lcd_ridge_height])
                rotate([0,0,-30])
                    cube([wall_thickness + 1, 2.5, 10]);
        }
        
    }


}

module back() {
    difference() {
        union() {
        
            outside(back_height);
   
            translate([wall_thickness, wall_thickness, wall_thickness])
                cube([board_x, board_y, 4]);
        }
        
        
        translate([wall_thickness + 2, wall_thickness + 2, wall_thickness])
                cube([board_x - 4, board_y - 4, 4]);
        
        // vents!
        for ( i = [0:1:5] ) {
                translate([wall_thickness + ((board_x - 11) / 2) + (i * 2), wall_thickness + (board_y / 4.0), -0.1])
                cube([1, board_y / 2.0, wall_thickness +  0.1 ]);
        }
        
        // TODO: housing for sensor at far Y. union.
        // TODO: standoffs to hold board in place

    }
}

//front();
//translate([-50, 0, 0])
    back();
